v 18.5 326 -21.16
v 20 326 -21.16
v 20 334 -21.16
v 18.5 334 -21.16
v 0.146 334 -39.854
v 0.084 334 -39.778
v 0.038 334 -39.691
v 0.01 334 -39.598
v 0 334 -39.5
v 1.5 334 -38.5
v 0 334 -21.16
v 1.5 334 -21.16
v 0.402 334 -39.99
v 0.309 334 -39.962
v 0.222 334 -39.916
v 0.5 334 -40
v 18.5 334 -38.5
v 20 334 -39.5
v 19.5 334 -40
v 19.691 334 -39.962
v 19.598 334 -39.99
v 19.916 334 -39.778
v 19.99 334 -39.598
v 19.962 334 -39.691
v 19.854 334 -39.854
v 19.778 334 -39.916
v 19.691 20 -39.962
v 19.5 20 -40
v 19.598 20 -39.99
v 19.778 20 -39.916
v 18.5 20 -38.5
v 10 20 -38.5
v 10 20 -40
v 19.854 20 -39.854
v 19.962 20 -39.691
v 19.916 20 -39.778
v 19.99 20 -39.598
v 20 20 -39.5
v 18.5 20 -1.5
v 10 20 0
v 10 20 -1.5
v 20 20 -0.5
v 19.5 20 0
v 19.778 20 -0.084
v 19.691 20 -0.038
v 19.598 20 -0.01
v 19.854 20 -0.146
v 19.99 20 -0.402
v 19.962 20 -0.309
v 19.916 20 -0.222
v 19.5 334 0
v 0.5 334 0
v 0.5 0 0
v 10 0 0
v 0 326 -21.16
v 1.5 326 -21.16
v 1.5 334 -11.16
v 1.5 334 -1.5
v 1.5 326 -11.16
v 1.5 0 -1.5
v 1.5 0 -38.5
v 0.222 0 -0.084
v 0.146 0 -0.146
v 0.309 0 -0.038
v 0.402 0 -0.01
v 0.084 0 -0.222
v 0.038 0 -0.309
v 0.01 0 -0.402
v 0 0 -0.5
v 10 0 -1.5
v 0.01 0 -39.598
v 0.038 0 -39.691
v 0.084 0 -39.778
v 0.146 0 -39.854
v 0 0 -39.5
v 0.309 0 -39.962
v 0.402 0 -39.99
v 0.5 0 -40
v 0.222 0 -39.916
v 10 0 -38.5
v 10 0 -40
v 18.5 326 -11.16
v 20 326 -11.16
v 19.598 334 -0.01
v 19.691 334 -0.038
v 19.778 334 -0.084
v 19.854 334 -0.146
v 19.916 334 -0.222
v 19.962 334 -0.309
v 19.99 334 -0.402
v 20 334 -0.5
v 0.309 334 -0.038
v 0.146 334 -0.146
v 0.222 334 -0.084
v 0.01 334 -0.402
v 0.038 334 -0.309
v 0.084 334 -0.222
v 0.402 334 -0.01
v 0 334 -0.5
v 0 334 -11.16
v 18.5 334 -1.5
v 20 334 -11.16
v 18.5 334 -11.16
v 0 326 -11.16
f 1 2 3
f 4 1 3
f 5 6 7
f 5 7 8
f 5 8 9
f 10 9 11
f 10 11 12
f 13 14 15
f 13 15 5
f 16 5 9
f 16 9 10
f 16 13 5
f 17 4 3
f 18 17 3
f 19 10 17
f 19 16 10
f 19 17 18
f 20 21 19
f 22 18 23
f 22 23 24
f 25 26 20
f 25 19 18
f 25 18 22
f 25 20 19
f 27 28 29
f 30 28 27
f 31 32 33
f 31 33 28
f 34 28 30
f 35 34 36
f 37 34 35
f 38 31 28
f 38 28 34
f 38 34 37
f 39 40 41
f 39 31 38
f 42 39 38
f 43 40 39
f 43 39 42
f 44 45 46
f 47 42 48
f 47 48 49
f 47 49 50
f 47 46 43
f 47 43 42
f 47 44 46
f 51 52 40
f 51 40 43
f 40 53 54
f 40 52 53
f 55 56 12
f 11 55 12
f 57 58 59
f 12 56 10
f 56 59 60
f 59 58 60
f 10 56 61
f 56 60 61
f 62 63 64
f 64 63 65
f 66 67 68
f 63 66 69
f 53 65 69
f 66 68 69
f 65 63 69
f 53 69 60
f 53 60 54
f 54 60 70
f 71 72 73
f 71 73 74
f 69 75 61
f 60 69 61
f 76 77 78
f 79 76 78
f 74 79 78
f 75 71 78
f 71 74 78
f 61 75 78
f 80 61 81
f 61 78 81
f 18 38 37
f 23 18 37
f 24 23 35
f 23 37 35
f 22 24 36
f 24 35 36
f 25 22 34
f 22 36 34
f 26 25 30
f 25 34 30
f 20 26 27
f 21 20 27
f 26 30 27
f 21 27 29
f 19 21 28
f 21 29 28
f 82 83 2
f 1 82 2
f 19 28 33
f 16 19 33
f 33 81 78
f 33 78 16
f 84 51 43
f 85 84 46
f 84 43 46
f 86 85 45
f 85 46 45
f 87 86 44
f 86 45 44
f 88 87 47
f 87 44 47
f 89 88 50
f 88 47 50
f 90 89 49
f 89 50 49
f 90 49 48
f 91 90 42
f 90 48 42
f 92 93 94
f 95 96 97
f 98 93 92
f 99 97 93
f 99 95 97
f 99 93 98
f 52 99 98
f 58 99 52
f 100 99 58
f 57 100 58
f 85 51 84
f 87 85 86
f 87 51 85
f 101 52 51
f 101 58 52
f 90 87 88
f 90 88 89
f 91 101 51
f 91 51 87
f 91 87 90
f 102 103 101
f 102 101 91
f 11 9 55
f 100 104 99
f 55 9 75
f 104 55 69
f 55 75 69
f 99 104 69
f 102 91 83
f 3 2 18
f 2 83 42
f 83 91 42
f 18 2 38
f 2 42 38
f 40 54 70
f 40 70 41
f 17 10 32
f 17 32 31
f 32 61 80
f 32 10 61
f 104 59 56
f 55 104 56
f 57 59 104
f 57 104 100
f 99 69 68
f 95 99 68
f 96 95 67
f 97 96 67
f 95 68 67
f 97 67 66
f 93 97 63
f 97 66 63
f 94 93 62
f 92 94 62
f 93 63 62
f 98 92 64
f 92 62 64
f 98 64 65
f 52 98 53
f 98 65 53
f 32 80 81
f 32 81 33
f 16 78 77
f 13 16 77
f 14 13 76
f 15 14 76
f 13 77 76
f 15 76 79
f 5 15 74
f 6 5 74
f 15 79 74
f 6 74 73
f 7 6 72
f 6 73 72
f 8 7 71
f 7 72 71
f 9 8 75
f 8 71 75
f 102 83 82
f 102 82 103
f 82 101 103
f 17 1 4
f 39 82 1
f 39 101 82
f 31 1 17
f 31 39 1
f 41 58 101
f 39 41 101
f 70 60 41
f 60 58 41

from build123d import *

# Parameters (mm, degrees)
SKETCH1_W           = 17
SKETCH1_H           = 37
BOSS_EXTRUDE1_DEPTH = 334
SKETCH2_W           = 10
SKETCH2_H           = 20
CUT_EXTRUDE1_DEPTH  = 40
SKETCH4_W           = 10
SKETCH4_H           = 8
CUT_EXTRUDE3_DEPTH  = 337.980711614


with BuildPart() as part:
    # Sketch1 → Boss-Extrude1 (new body)
    with BuildSketch(Plane(origin=(0, 0, 0), x_dir=(1, 0, 0), z_dir=(0, 1, 0))):
        with BuildLine():
            Line((0.5, 0), (19.5, 0))
            ThreePointArc((19.5, 0), (19.853553391, 0.146446609), (20, 0.5))
            Line((20, 0.5), (20, 39.5))
            ThreePointArc((20, 39.5), (19.853553391, 39.853553391), (19.5, 40))
            Line((19.5, 40), (0.5, 40))
            ThreePointArc((0.5, 40), (0.146446609, 39.853553391), (0, 39.5))
            Line((0, 39.5), (0, 0.5))
            ThreePointArc((0, 0.5), (0.146446609, 0.146446609), (0.5, 0))
        make_face()
        with Locations((10, 20)):
            Rectangle(SKETCH1_W, SKETCH1_H, mode=Mode.SUBTRACT)
    extrude(amount=BOSS_EXTRUDE1_DEPTH)

    # Sketch2 → Cut-Extrude1 (cut)
    with BuildSketch(Plane.XY):
        with Locations((15, 10)):
            Rectangle(SKETCH2_W, SKETCH2_H)
    extrude(amount=-CUT_EXTRUDE1_DEPTH, mode=Mode.SUBTRACT)

    # Sketch4 → Cut-Extrude3 (cut, through all)
    with BuildSketch(Plane(origin=(20, 0, 0), x_dir=(0, 0, -1), z_dir=(1, 0, 0))):
        with Locations((16.16, 330)):
            Rectangle(SKETCH4_W, SKETCH4_H)
    extrude(amount=-CUT_EXTRUDE3_DEPTH, mode=Mode.SUBTRACT)


solid = part.part
